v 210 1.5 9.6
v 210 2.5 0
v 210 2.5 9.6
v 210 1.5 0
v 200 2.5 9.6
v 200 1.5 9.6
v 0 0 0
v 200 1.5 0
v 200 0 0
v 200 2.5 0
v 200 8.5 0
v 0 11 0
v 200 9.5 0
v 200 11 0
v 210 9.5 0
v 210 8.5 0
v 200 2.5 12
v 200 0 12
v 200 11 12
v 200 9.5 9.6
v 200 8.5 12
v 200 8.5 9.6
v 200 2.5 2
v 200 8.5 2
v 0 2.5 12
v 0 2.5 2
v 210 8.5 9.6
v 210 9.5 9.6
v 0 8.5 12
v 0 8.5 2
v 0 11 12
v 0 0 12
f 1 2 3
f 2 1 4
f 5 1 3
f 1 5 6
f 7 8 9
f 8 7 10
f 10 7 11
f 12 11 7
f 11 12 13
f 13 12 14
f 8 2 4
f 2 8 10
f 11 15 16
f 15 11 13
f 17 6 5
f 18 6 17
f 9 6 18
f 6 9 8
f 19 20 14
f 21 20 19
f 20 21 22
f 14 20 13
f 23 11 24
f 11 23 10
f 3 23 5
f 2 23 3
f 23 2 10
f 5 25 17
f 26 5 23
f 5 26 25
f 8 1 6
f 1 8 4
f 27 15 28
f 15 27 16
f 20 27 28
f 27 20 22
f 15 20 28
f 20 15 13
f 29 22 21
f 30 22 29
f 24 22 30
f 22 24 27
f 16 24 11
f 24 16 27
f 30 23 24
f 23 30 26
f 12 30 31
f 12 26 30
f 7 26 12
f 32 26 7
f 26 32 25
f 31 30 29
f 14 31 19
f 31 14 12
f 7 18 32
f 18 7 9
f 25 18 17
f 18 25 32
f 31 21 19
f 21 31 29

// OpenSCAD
$fn = 100; 
l = 200; // length
h = 12;
type = "r"; // l = left; m = middle; r = right

module rail() {
    difference() {
        union() {
            cube([l, 11, 2]);

            // Vordere Schiene
            color("green")
            translate([0, 0, 0])
            cube([l, 2.5, h]);

            // Hintere Schiene
            color("green")
            translate([0, 8.5, 0])
            cube([l, 2.5, h]);

            if(type == "r" || type == "m") {
                // Stutzen vorne
                color("cyan")
                translate([l, 1.5, 0])
                cube([10, 1, h-2.4]);

                // Stutzen hinten
                color("cyan")
                translate([l, 8.5, 0])
                cube([10, 1, h-2.4]);
            }
        }

        if(type == "l" || type == "m") {
            // Ausschnitt links vorne
            color("red")
            translate([-1, 1.3, -1])
            cube([12, 1.4, h + 1 - 2]);

            // Ausschnitt links hinten
            color("red")
            translate([-1, 8.3, -1])
            cube([12, 1.4, h + 1 - 2]);
        }
    }
}

rail();
// translate([l + 10, 0, 0])
// rail();
